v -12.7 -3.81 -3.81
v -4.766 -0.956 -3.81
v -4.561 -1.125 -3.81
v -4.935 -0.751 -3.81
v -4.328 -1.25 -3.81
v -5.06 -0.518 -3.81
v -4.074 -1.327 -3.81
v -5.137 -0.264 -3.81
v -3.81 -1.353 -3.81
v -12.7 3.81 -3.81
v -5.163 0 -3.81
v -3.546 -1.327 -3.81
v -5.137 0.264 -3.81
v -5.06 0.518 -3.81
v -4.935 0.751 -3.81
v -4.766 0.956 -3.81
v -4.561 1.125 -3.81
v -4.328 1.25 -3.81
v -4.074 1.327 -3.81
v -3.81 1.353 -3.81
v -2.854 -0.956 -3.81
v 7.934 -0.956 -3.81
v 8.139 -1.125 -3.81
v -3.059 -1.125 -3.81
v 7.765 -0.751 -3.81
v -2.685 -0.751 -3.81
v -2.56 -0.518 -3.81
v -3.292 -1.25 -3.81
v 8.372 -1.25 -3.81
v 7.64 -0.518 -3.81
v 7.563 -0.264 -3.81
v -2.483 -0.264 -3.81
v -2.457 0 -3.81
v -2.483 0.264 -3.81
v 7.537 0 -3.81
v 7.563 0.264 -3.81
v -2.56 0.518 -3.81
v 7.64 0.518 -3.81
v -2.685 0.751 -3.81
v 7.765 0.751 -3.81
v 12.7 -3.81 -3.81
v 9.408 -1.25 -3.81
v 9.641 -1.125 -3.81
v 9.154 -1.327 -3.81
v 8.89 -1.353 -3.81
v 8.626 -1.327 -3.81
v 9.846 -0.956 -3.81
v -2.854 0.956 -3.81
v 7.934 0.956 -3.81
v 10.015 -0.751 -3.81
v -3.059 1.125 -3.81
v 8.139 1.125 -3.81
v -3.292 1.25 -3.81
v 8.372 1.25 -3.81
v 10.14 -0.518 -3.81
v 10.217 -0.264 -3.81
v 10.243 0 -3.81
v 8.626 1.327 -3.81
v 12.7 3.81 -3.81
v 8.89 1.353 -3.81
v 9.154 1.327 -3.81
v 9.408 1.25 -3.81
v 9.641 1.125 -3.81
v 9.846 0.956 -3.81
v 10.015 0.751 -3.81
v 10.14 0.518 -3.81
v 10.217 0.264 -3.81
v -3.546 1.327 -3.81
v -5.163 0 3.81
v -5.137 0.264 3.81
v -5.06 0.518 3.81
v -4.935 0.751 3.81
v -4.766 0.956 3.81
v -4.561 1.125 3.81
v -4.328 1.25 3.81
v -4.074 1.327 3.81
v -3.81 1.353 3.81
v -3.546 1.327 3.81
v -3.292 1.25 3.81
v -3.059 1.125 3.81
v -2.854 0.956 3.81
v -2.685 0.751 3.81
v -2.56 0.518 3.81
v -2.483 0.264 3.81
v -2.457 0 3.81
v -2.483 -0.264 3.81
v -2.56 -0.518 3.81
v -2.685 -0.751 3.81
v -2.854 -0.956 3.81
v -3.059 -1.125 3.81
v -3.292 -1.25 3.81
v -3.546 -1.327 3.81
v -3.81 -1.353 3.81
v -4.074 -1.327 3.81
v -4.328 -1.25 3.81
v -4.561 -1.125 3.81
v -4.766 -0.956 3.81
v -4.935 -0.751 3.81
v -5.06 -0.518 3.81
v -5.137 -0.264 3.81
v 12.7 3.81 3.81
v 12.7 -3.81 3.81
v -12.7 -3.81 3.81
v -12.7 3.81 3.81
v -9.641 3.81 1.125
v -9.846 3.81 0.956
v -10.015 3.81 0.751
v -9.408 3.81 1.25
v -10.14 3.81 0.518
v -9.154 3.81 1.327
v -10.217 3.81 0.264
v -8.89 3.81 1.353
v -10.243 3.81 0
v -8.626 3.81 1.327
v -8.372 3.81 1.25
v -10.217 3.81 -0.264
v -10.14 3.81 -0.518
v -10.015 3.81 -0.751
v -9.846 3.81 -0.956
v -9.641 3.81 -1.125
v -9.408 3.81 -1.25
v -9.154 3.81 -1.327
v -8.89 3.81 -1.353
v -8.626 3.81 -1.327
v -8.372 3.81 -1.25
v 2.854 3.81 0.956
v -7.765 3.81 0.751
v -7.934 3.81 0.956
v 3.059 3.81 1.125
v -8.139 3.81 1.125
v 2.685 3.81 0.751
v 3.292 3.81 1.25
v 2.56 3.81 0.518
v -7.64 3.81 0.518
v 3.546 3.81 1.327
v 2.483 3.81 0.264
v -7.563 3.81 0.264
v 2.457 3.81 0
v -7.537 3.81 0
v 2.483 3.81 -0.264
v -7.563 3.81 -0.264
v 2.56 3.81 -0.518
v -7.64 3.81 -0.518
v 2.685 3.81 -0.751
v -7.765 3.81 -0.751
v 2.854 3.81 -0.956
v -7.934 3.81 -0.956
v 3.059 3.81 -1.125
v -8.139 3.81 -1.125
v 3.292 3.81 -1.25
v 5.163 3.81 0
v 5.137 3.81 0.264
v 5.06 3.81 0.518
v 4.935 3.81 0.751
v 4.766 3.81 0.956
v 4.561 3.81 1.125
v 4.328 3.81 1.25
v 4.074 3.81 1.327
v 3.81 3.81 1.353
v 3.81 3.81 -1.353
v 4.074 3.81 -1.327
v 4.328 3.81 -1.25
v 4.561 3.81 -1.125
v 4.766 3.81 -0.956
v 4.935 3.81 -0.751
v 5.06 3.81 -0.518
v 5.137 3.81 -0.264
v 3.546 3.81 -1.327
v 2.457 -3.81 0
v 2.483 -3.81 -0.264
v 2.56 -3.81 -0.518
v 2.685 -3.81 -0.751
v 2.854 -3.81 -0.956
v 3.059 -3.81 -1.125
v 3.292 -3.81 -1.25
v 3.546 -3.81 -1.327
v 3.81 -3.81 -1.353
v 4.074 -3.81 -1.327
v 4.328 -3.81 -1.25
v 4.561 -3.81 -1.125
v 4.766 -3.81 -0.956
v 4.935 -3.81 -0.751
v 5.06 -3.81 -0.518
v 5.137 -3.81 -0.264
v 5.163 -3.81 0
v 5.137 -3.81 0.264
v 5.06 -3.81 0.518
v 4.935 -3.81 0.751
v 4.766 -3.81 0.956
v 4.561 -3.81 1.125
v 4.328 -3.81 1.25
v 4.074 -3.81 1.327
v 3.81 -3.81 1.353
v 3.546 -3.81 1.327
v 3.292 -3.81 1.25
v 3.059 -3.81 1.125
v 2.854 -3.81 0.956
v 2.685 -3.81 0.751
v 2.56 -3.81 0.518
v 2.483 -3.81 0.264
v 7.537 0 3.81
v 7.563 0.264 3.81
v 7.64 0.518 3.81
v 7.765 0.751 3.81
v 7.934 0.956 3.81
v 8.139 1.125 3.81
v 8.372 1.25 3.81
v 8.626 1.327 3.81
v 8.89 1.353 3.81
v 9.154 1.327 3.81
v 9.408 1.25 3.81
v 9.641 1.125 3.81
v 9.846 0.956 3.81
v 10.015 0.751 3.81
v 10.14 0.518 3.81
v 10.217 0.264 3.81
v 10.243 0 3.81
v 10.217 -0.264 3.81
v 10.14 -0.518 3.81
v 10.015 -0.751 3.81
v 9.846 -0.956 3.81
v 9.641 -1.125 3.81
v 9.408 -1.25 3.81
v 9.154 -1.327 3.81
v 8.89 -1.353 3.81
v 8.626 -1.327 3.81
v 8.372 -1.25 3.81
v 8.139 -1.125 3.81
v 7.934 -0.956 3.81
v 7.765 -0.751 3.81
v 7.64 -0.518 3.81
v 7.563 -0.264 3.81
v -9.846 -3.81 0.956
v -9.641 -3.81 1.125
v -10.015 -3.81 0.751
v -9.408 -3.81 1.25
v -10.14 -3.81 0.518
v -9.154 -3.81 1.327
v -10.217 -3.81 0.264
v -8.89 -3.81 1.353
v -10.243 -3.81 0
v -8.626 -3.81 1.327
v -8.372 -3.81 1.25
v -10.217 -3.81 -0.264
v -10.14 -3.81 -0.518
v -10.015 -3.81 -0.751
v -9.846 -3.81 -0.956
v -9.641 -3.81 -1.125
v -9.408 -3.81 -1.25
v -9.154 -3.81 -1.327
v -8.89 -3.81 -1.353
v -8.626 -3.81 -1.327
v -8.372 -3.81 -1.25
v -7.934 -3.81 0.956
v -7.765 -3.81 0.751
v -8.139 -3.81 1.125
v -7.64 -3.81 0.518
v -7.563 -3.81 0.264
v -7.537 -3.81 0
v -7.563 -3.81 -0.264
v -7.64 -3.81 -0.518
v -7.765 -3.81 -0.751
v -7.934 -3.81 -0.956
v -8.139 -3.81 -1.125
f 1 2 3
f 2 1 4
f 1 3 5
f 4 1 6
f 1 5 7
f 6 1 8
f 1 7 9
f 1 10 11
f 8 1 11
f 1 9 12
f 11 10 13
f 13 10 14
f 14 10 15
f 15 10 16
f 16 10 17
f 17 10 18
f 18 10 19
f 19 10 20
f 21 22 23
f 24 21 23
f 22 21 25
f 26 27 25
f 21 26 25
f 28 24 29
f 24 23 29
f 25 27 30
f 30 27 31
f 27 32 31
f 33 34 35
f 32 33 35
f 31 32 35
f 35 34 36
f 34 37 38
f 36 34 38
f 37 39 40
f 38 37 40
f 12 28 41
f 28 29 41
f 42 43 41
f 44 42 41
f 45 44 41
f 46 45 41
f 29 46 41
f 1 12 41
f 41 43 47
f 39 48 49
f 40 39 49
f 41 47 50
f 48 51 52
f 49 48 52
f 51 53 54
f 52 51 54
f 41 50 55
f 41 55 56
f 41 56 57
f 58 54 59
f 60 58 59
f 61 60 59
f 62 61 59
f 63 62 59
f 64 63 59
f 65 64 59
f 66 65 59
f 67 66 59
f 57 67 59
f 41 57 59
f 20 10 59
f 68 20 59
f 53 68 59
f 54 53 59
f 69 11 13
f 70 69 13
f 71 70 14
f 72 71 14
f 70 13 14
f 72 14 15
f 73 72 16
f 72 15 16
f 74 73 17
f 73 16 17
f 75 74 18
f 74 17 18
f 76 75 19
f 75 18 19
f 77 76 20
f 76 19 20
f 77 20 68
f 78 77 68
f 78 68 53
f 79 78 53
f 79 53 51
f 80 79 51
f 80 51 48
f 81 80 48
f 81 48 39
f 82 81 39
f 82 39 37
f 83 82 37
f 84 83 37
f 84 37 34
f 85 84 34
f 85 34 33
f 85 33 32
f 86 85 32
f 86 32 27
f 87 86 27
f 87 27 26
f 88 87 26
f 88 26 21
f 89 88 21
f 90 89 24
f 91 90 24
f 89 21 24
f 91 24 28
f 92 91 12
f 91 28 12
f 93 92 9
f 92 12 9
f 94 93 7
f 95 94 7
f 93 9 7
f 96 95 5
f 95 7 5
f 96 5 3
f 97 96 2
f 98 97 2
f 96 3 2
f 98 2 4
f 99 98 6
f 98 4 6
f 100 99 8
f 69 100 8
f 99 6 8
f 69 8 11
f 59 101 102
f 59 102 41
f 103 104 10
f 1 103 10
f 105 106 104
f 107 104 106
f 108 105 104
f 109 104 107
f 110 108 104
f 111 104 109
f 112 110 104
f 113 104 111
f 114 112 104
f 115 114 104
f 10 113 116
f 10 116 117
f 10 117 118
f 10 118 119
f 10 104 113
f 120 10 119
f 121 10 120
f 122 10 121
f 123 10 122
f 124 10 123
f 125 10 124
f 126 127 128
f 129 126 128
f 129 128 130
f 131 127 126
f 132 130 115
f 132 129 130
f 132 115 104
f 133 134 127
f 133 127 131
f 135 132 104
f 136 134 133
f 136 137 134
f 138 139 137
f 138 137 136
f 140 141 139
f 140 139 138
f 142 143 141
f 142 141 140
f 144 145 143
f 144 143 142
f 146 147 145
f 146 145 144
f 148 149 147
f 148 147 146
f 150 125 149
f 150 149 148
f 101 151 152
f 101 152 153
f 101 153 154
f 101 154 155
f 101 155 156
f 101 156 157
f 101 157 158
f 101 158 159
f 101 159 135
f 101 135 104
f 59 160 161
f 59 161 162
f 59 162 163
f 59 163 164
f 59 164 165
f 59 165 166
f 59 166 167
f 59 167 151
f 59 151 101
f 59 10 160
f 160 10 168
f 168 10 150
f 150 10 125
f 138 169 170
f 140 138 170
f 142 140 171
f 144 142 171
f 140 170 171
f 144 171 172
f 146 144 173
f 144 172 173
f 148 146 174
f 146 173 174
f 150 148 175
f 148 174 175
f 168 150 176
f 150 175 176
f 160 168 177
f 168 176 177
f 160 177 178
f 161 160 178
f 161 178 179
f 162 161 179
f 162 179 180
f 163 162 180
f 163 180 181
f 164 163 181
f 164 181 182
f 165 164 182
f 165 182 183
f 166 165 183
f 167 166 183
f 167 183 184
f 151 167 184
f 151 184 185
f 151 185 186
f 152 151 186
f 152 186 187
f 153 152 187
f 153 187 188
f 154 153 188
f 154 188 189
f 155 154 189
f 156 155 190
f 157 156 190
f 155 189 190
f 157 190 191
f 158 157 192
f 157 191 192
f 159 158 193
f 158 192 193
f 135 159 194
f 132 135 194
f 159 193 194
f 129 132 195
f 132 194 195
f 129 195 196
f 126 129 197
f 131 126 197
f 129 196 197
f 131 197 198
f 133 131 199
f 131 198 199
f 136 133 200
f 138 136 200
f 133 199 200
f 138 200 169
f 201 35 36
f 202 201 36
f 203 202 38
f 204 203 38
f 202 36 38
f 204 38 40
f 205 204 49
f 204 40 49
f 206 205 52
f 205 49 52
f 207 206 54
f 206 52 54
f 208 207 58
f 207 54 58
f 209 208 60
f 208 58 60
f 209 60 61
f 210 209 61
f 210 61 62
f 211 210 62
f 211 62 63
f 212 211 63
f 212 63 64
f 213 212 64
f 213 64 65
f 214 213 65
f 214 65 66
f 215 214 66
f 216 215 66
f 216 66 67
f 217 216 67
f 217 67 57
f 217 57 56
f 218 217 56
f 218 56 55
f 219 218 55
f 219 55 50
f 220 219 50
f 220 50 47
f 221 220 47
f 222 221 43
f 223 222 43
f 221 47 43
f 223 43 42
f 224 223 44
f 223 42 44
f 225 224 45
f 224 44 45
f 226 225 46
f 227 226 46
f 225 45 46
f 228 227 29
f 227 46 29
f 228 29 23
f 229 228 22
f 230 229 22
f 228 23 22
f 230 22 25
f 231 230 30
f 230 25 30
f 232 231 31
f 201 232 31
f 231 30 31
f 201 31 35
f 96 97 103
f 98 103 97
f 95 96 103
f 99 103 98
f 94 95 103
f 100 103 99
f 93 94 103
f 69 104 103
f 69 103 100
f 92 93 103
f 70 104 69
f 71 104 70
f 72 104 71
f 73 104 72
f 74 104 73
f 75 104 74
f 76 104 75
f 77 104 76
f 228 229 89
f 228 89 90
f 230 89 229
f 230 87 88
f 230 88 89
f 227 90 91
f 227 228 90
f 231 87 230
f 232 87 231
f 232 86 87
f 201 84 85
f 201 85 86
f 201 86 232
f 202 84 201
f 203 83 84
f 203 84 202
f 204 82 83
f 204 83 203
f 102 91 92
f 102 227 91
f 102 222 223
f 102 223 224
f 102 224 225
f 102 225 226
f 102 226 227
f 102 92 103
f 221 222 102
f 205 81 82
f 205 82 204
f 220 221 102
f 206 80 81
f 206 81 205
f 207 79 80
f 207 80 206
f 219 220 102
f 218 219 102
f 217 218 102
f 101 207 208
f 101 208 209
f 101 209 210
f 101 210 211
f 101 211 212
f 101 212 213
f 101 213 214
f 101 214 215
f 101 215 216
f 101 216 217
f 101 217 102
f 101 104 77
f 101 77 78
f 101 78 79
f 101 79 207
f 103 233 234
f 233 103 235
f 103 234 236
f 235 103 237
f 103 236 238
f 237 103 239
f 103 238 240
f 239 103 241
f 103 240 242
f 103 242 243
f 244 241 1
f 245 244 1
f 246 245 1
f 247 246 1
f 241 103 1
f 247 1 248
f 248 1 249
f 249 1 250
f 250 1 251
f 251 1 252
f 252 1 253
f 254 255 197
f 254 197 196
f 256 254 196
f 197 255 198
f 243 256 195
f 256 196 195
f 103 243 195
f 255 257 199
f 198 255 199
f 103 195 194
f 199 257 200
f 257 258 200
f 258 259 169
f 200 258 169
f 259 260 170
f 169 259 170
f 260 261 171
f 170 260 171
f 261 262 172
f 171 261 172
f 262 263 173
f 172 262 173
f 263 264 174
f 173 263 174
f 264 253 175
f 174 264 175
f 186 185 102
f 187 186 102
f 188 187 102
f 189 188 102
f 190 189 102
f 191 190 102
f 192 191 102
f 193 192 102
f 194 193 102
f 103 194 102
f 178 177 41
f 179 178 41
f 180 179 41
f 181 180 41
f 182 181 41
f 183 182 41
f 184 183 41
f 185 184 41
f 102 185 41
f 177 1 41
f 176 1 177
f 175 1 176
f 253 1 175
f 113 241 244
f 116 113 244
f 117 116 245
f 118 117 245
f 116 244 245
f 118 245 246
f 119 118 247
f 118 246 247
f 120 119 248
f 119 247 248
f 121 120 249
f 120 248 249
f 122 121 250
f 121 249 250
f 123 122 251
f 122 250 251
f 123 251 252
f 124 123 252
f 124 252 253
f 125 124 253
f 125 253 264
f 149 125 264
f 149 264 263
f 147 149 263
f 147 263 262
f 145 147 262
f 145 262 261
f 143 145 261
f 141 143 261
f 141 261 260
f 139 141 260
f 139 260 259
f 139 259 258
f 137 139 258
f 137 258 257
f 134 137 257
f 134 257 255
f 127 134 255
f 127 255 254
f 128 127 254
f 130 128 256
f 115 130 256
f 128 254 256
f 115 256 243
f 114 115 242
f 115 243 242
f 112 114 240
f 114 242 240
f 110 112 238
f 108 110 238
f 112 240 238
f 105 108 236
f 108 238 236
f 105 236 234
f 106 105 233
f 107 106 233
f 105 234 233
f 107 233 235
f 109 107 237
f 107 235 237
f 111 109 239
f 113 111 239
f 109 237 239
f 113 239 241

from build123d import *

# Parameters (mm, degrees)
SKETCH1_W                 = 25.4
SKETCH1_H                 = 7.62
BOSS_EXTRUDE1_DEPTH       = 3.81
TAP_DRILL_FOR_6_32_TAP1_D = 2.7051
TAP_DRILL_FOR_6_32_TAP2_D = 2.7051


with BuildPart() as part:
    # Sketch1 → Boss-Extrude1 (new, symmetric)
    with BuildSketch(Plane(origin=(0, 0, 0), x_dir=(1, 0, 0), z_dir=(0, 1, 0))):
        Rectangle(SKETCH1_W, SKETCH1_H)
    extrude(amount=BOSS_EXTRUDE1_DEPTH, both=True)

    # Tap Drill for #6-32 Tap1 (through all)
    with Locations(Plane(origin=(0, 3.81, 0), x_dir=(1, 0, 0), z_dir=(0, 1, 0))):
        with Locations((-8.89, 0), (3.81, 0)):
            Hole(TAP_DRILL_FOR_6_32_TAP1_D / 2)

    # Tap Drill for #6-32 Tap2 (through all)
    with Locations(Plane.XY.offset(3.81)):
        with Locations((-3.81, 0), (8.89, 0)):
            Hole(TAP_DRILL_FOR_6_32_TAP2_D / 2)


solid = part.part
